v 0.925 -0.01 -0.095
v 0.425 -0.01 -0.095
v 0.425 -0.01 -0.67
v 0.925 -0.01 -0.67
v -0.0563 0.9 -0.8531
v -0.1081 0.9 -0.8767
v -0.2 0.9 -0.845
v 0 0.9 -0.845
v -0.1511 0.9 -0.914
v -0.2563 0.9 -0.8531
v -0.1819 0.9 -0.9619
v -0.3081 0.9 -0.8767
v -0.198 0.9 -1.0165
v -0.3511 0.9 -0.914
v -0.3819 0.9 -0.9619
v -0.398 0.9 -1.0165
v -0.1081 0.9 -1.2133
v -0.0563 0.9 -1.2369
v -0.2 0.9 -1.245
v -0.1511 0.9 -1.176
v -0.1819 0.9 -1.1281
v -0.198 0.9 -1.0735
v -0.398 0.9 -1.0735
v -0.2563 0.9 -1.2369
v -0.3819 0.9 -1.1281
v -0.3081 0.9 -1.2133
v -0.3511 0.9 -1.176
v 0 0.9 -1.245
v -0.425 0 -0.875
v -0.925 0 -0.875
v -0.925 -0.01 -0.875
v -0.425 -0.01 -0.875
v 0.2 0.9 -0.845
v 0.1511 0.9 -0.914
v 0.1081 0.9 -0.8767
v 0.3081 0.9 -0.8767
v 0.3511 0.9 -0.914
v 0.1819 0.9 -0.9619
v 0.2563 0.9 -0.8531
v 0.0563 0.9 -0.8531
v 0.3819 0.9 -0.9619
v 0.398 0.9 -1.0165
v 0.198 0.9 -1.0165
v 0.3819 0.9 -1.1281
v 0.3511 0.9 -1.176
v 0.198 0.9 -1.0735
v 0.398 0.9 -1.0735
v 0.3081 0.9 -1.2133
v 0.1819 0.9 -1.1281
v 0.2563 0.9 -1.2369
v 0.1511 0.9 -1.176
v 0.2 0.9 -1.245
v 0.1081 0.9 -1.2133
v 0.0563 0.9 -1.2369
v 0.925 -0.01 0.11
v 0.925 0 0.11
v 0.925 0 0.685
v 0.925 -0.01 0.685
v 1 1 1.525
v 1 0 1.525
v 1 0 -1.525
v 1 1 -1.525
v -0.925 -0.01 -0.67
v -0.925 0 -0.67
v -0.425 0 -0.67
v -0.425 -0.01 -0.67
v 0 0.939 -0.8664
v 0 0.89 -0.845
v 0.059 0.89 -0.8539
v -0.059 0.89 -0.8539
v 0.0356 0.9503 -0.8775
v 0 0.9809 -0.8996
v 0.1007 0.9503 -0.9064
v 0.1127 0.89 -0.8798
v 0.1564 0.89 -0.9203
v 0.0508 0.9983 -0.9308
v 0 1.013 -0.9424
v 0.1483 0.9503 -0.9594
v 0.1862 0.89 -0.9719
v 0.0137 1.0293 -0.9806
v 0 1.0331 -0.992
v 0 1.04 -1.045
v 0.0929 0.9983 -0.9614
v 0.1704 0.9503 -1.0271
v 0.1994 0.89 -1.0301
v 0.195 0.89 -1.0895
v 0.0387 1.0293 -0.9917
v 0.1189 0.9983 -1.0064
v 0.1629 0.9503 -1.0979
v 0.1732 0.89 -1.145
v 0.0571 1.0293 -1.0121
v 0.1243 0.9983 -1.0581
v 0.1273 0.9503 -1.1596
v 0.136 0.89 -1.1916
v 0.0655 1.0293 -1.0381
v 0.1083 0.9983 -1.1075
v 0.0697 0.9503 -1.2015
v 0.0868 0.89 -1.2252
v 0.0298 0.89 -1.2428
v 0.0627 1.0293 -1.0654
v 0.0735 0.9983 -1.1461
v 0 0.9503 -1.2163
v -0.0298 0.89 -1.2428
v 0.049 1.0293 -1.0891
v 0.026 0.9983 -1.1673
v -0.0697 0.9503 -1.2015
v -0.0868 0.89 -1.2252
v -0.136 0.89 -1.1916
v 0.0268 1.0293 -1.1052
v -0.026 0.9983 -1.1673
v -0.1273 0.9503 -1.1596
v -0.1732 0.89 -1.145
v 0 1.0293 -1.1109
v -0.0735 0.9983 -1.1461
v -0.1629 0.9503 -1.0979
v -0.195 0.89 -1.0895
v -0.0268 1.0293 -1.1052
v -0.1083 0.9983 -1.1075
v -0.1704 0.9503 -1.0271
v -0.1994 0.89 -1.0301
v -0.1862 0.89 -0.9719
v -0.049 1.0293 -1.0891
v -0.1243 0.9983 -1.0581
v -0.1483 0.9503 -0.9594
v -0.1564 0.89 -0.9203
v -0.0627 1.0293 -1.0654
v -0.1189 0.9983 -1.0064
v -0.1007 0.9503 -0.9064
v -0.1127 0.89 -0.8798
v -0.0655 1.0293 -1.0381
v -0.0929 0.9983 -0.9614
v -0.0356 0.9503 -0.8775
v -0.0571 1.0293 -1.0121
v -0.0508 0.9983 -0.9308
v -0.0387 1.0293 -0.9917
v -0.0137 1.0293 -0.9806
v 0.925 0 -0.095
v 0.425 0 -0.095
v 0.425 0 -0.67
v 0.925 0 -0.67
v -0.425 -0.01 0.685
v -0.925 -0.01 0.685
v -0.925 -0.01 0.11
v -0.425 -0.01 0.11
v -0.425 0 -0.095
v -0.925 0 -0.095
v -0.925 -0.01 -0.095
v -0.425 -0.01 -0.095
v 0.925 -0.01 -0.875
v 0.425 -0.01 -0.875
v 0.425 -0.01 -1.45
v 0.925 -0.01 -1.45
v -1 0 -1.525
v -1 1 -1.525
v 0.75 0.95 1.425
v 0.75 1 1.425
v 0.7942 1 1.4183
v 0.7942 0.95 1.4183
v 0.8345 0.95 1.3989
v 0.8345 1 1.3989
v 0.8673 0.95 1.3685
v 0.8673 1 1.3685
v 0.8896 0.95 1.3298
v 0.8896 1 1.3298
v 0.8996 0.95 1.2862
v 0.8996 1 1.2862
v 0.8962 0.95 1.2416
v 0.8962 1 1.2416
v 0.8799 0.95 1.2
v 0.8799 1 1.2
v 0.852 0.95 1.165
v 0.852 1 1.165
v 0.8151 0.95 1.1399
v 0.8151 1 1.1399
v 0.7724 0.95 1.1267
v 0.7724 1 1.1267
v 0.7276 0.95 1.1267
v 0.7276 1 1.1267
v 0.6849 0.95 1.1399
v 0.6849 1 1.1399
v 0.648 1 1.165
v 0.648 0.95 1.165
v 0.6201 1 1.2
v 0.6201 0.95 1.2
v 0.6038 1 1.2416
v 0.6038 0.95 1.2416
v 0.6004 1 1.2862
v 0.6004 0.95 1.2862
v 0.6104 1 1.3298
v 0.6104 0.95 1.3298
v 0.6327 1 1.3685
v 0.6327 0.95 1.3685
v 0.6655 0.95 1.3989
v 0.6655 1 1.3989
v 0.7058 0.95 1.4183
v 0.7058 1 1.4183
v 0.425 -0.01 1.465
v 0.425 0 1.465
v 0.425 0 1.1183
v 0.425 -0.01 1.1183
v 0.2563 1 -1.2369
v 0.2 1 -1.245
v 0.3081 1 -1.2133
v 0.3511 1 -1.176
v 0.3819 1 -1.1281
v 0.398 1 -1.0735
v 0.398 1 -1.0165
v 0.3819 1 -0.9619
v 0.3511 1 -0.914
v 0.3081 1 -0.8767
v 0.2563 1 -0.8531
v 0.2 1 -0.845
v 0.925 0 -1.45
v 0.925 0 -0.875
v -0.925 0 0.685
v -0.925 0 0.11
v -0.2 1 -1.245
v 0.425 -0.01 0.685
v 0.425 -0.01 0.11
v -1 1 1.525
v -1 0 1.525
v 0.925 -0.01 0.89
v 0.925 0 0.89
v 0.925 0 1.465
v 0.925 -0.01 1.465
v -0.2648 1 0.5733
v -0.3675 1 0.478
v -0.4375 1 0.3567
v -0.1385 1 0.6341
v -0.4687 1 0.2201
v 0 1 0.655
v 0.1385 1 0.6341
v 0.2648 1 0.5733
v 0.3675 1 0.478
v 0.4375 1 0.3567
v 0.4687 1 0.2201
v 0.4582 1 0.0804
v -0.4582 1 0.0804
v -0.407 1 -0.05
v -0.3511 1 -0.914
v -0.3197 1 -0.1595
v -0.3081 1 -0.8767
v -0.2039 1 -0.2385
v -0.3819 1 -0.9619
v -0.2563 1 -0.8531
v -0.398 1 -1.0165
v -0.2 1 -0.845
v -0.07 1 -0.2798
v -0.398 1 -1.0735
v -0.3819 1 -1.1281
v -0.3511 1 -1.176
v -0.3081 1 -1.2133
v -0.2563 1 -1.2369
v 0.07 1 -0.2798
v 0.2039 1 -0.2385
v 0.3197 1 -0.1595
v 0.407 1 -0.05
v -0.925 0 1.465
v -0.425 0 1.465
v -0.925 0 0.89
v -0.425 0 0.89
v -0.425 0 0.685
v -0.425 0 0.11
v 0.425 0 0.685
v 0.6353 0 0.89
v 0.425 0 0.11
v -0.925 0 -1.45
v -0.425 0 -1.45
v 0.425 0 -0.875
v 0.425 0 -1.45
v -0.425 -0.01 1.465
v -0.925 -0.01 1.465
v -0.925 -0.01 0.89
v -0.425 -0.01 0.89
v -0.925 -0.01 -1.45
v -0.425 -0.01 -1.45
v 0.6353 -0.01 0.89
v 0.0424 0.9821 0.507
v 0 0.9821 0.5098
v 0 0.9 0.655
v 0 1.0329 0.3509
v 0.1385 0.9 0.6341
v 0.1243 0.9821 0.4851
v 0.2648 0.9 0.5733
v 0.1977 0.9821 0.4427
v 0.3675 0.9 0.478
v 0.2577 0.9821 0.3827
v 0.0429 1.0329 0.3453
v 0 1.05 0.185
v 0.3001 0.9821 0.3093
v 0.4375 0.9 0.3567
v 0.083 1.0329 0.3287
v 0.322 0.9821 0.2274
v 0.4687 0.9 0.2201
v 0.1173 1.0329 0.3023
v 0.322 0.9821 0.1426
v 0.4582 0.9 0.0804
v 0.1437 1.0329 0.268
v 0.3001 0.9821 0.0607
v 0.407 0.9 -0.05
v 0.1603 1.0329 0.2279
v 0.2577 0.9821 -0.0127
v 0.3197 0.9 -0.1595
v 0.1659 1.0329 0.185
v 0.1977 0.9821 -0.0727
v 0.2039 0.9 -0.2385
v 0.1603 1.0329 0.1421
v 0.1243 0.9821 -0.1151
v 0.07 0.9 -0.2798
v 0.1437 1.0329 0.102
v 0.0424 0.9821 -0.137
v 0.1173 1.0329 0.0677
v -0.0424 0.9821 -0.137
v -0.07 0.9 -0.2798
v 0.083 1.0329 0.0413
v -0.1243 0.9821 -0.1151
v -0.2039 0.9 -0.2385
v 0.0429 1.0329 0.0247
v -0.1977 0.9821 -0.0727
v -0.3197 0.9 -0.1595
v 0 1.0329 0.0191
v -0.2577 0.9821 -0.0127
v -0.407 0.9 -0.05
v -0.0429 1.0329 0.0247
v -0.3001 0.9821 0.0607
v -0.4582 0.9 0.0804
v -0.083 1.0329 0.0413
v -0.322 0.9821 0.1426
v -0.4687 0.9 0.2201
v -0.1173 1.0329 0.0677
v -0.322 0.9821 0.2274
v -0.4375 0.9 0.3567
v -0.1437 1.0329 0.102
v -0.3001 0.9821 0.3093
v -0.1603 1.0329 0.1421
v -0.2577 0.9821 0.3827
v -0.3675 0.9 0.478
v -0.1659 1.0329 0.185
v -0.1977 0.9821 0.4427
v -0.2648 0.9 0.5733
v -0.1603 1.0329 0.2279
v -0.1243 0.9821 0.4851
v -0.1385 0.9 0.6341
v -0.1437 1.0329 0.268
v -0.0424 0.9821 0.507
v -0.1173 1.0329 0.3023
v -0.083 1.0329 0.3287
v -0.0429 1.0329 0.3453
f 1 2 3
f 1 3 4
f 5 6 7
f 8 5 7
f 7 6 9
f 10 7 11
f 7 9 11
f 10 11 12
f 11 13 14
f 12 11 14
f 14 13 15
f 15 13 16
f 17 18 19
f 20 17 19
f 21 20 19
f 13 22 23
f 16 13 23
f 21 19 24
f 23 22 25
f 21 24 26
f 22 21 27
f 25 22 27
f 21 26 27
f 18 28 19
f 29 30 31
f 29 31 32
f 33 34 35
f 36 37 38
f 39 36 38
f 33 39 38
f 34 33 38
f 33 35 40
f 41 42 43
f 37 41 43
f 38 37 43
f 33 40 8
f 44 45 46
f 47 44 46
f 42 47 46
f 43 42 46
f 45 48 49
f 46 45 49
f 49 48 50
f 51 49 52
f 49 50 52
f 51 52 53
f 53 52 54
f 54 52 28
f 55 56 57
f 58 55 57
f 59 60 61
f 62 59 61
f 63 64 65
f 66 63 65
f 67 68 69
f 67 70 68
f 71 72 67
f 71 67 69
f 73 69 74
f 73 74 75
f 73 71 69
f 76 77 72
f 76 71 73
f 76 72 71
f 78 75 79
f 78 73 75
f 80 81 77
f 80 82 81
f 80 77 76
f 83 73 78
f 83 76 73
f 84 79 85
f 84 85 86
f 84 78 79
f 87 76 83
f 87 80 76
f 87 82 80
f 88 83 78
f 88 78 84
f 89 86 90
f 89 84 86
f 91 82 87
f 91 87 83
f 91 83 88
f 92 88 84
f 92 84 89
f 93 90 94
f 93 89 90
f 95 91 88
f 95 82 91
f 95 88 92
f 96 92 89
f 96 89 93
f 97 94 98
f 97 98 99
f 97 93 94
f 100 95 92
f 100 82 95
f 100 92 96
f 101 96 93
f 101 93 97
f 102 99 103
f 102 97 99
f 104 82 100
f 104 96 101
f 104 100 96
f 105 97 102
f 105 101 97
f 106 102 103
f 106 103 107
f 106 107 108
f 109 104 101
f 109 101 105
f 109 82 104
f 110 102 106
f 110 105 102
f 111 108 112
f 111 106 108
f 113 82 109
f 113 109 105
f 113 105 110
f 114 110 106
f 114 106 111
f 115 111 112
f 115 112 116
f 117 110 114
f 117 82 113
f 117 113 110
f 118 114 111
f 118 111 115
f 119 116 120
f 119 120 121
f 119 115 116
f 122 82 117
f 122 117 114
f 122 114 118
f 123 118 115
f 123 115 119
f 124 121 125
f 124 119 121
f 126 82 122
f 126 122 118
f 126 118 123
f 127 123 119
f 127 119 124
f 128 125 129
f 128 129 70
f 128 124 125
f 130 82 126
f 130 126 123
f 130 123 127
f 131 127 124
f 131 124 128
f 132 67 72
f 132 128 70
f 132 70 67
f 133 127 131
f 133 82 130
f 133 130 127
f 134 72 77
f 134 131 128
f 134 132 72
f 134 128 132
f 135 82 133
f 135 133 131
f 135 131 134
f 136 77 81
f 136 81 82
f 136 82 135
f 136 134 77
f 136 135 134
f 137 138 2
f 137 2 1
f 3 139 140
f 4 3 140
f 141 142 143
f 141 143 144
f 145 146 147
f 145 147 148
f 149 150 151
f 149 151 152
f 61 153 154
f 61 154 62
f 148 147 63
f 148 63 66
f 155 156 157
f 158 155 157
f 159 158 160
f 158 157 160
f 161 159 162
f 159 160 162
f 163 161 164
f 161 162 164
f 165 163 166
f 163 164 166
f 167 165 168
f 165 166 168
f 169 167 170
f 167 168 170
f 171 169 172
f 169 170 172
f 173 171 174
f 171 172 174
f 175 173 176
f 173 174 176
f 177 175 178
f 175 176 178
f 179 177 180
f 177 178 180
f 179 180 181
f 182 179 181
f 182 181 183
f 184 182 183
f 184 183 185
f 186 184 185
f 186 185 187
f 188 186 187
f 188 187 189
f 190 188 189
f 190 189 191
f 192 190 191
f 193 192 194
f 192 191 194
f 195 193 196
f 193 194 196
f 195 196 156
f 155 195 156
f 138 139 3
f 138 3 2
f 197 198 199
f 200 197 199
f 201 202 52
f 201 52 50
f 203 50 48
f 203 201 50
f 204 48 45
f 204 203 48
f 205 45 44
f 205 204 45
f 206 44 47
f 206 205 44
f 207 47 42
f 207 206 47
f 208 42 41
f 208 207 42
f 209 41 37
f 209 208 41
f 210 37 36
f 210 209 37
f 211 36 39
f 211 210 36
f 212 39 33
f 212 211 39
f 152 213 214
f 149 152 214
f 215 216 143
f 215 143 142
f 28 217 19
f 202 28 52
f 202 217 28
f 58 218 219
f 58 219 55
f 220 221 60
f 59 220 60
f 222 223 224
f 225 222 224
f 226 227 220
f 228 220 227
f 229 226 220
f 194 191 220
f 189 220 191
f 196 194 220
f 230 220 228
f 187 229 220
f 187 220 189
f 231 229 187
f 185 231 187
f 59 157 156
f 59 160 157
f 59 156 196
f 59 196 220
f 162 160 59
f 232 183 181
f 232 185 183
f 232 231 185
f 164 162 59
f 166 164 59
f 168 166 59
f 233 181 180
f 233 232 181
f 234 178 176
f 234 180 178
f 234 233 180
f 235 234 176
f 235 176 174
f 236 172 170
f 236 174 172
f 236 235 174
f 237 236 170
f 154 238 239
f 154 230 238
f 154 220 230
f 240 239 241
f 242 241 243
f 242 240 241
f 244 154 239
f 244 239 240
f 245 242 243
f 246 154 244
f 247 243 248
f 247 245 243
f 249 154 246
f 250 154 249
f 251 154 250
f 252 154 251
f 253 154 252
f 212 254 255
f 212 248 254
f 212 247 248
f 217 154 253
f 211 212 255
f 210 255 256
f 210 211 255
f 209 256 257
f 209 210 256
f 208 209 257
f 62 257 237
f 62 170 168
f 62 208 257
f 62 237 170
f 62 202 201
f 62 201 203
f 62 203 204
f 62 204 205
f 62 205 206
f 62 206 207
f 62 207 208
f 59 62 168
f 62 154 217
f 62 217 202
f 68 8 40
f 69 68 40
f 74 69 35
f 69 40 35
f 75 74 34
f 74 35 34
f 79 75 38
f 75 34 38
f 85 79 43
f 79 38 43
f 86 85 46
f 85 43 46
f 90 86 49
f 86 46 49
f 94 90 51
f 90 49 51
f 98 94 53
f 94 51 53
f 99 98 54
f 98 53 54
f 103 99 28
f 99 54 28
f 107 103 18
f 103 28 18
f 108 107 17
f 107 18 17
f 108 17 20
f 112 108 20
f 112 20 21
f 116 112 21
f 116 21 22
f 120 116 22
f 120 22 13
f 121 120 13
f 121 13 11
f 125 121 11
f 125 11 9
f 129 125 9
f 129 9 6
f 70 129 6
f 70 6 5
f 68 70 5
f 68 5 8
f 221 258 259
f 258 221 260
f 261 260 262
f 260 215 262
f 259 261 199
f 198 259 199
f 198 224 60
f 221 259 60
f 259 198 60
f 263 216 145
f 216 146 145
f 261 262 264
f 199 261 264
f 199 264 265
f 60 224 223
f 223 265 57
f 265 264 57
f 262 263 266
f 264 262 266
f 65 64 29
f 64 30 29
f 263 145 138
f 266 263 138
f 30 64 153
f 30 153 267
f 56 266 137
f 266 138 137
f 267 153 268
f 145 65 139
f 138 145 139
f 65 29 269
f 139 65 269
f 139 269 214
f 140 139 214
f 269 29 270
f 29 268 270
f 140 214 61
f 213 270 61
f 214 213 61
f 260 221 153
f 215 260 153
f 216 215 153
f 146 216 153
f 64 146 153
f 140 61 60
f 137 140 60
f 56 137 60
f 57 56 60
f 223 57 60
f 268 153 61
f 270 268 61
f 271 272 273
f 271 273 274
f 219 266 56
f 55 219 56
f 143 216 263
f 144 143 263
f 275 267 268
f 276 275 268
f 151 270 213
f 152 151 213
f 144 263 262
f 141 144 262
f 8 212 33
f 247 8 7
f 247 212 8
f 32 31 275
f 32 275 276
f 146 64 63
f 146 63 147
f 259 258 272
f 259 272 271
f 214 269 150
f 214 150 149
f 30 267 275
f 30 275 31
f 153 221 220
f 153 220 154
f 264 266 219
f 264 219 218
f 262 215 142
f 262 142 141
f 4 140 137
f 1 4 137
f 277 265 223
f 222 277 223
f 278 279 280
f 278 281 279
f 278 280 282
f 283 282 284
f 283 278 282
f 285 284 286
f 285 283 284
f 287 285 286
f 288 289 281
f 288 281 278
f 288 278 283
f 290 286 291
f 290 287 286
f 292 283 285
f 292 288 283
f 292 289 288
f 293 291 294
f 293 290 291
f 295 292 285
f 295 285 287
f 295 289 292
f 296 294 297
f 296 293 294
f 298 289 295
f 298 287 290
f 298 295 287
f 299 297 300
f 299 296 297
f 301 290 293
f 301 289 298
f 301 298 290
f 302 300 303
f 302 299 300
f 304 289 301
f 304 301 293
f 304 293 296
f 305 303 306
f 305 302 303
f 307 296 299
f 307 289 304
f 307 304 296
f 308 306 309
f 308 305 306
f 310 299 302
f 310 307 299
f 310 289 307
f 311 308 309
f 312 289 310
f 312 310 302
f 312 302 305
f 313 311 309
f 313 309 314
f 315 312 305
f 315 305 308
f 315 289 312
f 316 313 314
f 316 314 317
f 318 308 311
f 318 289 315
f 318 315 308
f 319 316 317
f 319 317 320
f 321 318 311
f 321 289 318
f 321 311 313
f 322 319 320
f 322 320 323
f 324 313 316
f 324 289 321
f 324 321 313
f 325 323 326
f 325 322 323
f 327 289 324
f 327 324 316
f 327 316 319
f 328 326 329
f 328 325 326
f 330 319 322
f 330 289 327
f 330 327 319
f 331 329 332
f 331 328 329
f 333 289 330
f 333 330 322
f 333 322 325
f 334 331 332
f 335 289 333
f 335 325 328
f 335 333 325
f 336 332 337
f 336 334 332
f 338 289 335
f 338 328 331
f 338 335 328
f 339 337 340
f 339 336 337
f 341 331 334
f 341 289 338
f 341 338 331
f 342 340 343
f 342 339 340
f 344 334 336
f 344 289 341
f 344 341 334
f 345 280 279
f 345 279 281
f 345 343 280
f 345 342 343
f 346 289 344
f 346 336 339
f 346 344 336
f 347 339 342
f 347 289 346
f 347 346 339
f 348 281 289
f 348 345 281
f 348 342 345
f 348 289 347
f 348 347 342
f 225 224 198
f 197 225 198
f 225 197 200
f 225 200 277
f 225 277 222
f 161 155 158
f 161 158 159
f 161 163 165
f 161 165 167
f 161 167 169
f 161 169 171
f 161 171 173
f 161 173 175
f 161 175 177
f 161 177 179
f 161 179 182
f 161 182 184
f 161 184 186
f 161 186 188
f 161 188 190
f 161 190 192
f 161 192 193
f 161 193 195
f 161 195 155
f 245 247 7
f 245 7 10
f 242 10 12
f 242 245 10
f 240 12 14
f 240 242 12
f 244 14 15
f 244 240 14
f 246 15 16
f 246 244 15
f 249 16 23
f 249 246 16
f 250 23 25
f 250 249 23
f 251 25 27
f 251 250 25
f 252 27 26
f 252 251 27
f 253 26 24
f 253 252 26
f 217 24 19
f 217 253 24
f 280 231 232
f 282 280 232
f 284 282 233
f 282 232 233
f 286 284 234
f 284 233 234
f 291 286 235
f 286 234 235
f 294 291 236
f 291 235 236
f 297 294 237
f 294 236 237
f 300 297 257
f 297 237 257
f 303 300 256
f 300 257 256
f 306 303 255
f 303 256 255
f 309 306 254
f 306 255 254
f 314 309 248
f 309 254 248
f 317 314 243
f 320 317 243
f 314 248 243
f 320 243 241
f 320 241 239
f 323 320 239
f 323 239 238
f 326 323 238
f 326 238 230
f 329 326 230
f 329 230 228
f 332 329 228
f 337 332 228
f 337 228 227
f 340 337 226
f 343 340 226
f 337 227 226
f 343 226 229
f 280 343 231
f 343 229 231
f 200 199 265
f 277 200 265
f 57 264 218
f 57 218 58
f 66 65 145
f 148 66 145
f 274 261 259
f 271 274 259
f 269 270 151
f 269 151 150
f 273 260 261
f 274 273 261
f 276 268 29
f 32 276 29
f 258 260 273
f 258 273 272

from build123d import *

# Parameters (mm, degrees)
SKETCH1_W           = 2
SKETCH1_H           = 3.05
BOSS_EXTRUDE1_DEPTH = 1
SKETCH2_R           = 0.47
CUT_EXTRUDE1_DEPTH  = 0.1
SKETCH3_R           = 0.15
CUT_EXTRUDE2_DEPTH  = 0.05
DOME1_FACE_RADIUS   = 0.47
DOME1_HEIGHT        = 0.15
SKETCH5_R           = 0.2
CUT_EXTRUDE3_DEPTH  = 0.01
DOME2_FACE_RADIUS   = 0.2
DOME2_HEIGHT        = 0.15
SKETCH6_W           = 0.5
SKETCH6_H           = 0.575
BOSS_EXTRUDE2_DEPTH = 0.01


with BuildPart() as part:
    # Sketch1 → Boss-Extrude1 (new body)
    with BuildSketch(Plane(origin=(0, 0, 0), x_dir=(1, 0, 0), z_dir=(0, 1, 0))):
        Rectangle(SKETCH1_W, SKETCH1_H)
    extrude(amount=BOSS_EXTRUDE1_DEPTH)

    # Sketch2 → Cut-Extrude1 (cut)
    with BuildSketch(Plane(origin=(0, 1, 0), x_dir=(1, 0, 0), z_dir=(0, 1, 0))):
        with Locations(Location((0, -0.185, 0), (0, 0, 270))):
            Circle(SKETCH2_R)
        with BuildLine():
            Line((-0.2, 1.245), (0.2, 1.245))
            ThreePointArc((0.2, 1.245), (0.4, 1.045), (0.2, 0.845))
            Line((0.2, 0.845), (-0.2, 0.845))
            ThreePointArc((-0.2, 0.845), (-0.4, 1.045), (-0.2, 1.245))
        make_face()
    extrude(amount=-CUT_EXTRUDE1_DEPTH, mode=Mode.SUBTRACT)

    # Sketch3 → Cut-Extrude2 (cut)
    with BuildSketch(Plane(origin=(0, 1, 0), x_dir=(1, 0, 0), z_dir=(0, 1, 0))):
        with Locations(Location((0.75, -1.275, 0), (0, 0, 270))):
            Circle(SKETCH3_R)
    extrude(amount=-CUT_EXTRUDE2_DEPTH, mode=Mode.SUBTRACT)

    # Dome1: a dome of height H over a round flat face of radius A is a cap of a sphere of radius (A * A + H * H) / (2 * H)
    dome1_r = (DOME1_FACE_RADIUS * DOME1_FACE_RADIUS + DOME1_HEIGHT * DOME1_HEIGHT) / (2 * DOME1_HEIGHT)
    dome1_base = Plane((0, 0.9, 0.185), z_dir=(0, 1, 0))
    with Locations(dome1_base.offset(DOME1_HEIGHT - dome1_r)):
        dome1_ball = Sphere(dome1_r, mode=Mode.PRIVATE)
    add(split(dome1_ball, bisect_by=dome1_base, keep=Keep.TOP, mode=Mode.PRIVATE))

    # Sketch5 → Cut-Extrude3 (cut)
    with BuildSketch(Plane(origin=(0, 0.9, 0), x_dir=(1, 0, 0), z_dir=(0, 1, 0))):
        with Locations(Location((0, 1.045, 0), (0, 0, 270))):
            Circle(SKETCH5_R)
    extrude(amount=-CUT_EXTRUDE3_DEPTH, mode=Mode.SUBTRACT)

    # Dome2: a dome of height H over a round flat face of radius A is a cap of a sphere of radius (A * A + H * H) / (2 * H)
    dome2_r = (DOME2_FACE_RADIUS * DOME2_FACE_RADIUS + DOME2_HEIGHT * DOME2_HEIGHT) / (2 * DOME2_HEIGHT)
    dome2_base = Plane((0, 0.89, -1.045), z_dir=(0, 1, 0))
    with Locations(dome2_base.offset(DOME2_HEIGHT - dome2_r)):
        dome2_ball = Sphere(dome2_r, mode=Mode.PRIVATE)
    add(split(dome2_ball, bisect_by=dome2_base, keep=Keep.TOP, mode=Mode.PRIVATE))

    # Sketch6 → Boss-Extrude2 (add)
    with BuildSketch(Plane.XZ):
        with Locations((0.675, -1.1625)):
            Rectangle(SKETCH6_W, SKETCH6_H)
        with Locations((0.675, -0.3825)):
            Rectangle(SKETCH6_W, SKETCH6_H)
        with Locations((0.675, 0.3975)):
            Rectangle(SKETCH6_W, SKETCH6_H)
        Polygon((0.925, 0.89), (0.925, 1.465), (0.425, 1.465), (0.425, 1.118326213), (0.635308002, 0.89), align=None)
        with Locations((-0.675, 1.1775)):
            Rectangle(SKETCH6_W, SKETCH6_H)
        with Locations((-0.675, 0.3975)):
            Rectangle(SKETCH6_W, SKETCH6_H)
        with Locations((-0.675, -0.3825)):
            Rectangle(SKETCH6_W, SKETCH6_H)
        with Locations((-0.675, -1.1625)):
            Rectangle(SKETCH6_W, SKETCH6_H)
    extrude(amount=BOSS_EXTRUDE2_DEPTH)


solid = part.part
